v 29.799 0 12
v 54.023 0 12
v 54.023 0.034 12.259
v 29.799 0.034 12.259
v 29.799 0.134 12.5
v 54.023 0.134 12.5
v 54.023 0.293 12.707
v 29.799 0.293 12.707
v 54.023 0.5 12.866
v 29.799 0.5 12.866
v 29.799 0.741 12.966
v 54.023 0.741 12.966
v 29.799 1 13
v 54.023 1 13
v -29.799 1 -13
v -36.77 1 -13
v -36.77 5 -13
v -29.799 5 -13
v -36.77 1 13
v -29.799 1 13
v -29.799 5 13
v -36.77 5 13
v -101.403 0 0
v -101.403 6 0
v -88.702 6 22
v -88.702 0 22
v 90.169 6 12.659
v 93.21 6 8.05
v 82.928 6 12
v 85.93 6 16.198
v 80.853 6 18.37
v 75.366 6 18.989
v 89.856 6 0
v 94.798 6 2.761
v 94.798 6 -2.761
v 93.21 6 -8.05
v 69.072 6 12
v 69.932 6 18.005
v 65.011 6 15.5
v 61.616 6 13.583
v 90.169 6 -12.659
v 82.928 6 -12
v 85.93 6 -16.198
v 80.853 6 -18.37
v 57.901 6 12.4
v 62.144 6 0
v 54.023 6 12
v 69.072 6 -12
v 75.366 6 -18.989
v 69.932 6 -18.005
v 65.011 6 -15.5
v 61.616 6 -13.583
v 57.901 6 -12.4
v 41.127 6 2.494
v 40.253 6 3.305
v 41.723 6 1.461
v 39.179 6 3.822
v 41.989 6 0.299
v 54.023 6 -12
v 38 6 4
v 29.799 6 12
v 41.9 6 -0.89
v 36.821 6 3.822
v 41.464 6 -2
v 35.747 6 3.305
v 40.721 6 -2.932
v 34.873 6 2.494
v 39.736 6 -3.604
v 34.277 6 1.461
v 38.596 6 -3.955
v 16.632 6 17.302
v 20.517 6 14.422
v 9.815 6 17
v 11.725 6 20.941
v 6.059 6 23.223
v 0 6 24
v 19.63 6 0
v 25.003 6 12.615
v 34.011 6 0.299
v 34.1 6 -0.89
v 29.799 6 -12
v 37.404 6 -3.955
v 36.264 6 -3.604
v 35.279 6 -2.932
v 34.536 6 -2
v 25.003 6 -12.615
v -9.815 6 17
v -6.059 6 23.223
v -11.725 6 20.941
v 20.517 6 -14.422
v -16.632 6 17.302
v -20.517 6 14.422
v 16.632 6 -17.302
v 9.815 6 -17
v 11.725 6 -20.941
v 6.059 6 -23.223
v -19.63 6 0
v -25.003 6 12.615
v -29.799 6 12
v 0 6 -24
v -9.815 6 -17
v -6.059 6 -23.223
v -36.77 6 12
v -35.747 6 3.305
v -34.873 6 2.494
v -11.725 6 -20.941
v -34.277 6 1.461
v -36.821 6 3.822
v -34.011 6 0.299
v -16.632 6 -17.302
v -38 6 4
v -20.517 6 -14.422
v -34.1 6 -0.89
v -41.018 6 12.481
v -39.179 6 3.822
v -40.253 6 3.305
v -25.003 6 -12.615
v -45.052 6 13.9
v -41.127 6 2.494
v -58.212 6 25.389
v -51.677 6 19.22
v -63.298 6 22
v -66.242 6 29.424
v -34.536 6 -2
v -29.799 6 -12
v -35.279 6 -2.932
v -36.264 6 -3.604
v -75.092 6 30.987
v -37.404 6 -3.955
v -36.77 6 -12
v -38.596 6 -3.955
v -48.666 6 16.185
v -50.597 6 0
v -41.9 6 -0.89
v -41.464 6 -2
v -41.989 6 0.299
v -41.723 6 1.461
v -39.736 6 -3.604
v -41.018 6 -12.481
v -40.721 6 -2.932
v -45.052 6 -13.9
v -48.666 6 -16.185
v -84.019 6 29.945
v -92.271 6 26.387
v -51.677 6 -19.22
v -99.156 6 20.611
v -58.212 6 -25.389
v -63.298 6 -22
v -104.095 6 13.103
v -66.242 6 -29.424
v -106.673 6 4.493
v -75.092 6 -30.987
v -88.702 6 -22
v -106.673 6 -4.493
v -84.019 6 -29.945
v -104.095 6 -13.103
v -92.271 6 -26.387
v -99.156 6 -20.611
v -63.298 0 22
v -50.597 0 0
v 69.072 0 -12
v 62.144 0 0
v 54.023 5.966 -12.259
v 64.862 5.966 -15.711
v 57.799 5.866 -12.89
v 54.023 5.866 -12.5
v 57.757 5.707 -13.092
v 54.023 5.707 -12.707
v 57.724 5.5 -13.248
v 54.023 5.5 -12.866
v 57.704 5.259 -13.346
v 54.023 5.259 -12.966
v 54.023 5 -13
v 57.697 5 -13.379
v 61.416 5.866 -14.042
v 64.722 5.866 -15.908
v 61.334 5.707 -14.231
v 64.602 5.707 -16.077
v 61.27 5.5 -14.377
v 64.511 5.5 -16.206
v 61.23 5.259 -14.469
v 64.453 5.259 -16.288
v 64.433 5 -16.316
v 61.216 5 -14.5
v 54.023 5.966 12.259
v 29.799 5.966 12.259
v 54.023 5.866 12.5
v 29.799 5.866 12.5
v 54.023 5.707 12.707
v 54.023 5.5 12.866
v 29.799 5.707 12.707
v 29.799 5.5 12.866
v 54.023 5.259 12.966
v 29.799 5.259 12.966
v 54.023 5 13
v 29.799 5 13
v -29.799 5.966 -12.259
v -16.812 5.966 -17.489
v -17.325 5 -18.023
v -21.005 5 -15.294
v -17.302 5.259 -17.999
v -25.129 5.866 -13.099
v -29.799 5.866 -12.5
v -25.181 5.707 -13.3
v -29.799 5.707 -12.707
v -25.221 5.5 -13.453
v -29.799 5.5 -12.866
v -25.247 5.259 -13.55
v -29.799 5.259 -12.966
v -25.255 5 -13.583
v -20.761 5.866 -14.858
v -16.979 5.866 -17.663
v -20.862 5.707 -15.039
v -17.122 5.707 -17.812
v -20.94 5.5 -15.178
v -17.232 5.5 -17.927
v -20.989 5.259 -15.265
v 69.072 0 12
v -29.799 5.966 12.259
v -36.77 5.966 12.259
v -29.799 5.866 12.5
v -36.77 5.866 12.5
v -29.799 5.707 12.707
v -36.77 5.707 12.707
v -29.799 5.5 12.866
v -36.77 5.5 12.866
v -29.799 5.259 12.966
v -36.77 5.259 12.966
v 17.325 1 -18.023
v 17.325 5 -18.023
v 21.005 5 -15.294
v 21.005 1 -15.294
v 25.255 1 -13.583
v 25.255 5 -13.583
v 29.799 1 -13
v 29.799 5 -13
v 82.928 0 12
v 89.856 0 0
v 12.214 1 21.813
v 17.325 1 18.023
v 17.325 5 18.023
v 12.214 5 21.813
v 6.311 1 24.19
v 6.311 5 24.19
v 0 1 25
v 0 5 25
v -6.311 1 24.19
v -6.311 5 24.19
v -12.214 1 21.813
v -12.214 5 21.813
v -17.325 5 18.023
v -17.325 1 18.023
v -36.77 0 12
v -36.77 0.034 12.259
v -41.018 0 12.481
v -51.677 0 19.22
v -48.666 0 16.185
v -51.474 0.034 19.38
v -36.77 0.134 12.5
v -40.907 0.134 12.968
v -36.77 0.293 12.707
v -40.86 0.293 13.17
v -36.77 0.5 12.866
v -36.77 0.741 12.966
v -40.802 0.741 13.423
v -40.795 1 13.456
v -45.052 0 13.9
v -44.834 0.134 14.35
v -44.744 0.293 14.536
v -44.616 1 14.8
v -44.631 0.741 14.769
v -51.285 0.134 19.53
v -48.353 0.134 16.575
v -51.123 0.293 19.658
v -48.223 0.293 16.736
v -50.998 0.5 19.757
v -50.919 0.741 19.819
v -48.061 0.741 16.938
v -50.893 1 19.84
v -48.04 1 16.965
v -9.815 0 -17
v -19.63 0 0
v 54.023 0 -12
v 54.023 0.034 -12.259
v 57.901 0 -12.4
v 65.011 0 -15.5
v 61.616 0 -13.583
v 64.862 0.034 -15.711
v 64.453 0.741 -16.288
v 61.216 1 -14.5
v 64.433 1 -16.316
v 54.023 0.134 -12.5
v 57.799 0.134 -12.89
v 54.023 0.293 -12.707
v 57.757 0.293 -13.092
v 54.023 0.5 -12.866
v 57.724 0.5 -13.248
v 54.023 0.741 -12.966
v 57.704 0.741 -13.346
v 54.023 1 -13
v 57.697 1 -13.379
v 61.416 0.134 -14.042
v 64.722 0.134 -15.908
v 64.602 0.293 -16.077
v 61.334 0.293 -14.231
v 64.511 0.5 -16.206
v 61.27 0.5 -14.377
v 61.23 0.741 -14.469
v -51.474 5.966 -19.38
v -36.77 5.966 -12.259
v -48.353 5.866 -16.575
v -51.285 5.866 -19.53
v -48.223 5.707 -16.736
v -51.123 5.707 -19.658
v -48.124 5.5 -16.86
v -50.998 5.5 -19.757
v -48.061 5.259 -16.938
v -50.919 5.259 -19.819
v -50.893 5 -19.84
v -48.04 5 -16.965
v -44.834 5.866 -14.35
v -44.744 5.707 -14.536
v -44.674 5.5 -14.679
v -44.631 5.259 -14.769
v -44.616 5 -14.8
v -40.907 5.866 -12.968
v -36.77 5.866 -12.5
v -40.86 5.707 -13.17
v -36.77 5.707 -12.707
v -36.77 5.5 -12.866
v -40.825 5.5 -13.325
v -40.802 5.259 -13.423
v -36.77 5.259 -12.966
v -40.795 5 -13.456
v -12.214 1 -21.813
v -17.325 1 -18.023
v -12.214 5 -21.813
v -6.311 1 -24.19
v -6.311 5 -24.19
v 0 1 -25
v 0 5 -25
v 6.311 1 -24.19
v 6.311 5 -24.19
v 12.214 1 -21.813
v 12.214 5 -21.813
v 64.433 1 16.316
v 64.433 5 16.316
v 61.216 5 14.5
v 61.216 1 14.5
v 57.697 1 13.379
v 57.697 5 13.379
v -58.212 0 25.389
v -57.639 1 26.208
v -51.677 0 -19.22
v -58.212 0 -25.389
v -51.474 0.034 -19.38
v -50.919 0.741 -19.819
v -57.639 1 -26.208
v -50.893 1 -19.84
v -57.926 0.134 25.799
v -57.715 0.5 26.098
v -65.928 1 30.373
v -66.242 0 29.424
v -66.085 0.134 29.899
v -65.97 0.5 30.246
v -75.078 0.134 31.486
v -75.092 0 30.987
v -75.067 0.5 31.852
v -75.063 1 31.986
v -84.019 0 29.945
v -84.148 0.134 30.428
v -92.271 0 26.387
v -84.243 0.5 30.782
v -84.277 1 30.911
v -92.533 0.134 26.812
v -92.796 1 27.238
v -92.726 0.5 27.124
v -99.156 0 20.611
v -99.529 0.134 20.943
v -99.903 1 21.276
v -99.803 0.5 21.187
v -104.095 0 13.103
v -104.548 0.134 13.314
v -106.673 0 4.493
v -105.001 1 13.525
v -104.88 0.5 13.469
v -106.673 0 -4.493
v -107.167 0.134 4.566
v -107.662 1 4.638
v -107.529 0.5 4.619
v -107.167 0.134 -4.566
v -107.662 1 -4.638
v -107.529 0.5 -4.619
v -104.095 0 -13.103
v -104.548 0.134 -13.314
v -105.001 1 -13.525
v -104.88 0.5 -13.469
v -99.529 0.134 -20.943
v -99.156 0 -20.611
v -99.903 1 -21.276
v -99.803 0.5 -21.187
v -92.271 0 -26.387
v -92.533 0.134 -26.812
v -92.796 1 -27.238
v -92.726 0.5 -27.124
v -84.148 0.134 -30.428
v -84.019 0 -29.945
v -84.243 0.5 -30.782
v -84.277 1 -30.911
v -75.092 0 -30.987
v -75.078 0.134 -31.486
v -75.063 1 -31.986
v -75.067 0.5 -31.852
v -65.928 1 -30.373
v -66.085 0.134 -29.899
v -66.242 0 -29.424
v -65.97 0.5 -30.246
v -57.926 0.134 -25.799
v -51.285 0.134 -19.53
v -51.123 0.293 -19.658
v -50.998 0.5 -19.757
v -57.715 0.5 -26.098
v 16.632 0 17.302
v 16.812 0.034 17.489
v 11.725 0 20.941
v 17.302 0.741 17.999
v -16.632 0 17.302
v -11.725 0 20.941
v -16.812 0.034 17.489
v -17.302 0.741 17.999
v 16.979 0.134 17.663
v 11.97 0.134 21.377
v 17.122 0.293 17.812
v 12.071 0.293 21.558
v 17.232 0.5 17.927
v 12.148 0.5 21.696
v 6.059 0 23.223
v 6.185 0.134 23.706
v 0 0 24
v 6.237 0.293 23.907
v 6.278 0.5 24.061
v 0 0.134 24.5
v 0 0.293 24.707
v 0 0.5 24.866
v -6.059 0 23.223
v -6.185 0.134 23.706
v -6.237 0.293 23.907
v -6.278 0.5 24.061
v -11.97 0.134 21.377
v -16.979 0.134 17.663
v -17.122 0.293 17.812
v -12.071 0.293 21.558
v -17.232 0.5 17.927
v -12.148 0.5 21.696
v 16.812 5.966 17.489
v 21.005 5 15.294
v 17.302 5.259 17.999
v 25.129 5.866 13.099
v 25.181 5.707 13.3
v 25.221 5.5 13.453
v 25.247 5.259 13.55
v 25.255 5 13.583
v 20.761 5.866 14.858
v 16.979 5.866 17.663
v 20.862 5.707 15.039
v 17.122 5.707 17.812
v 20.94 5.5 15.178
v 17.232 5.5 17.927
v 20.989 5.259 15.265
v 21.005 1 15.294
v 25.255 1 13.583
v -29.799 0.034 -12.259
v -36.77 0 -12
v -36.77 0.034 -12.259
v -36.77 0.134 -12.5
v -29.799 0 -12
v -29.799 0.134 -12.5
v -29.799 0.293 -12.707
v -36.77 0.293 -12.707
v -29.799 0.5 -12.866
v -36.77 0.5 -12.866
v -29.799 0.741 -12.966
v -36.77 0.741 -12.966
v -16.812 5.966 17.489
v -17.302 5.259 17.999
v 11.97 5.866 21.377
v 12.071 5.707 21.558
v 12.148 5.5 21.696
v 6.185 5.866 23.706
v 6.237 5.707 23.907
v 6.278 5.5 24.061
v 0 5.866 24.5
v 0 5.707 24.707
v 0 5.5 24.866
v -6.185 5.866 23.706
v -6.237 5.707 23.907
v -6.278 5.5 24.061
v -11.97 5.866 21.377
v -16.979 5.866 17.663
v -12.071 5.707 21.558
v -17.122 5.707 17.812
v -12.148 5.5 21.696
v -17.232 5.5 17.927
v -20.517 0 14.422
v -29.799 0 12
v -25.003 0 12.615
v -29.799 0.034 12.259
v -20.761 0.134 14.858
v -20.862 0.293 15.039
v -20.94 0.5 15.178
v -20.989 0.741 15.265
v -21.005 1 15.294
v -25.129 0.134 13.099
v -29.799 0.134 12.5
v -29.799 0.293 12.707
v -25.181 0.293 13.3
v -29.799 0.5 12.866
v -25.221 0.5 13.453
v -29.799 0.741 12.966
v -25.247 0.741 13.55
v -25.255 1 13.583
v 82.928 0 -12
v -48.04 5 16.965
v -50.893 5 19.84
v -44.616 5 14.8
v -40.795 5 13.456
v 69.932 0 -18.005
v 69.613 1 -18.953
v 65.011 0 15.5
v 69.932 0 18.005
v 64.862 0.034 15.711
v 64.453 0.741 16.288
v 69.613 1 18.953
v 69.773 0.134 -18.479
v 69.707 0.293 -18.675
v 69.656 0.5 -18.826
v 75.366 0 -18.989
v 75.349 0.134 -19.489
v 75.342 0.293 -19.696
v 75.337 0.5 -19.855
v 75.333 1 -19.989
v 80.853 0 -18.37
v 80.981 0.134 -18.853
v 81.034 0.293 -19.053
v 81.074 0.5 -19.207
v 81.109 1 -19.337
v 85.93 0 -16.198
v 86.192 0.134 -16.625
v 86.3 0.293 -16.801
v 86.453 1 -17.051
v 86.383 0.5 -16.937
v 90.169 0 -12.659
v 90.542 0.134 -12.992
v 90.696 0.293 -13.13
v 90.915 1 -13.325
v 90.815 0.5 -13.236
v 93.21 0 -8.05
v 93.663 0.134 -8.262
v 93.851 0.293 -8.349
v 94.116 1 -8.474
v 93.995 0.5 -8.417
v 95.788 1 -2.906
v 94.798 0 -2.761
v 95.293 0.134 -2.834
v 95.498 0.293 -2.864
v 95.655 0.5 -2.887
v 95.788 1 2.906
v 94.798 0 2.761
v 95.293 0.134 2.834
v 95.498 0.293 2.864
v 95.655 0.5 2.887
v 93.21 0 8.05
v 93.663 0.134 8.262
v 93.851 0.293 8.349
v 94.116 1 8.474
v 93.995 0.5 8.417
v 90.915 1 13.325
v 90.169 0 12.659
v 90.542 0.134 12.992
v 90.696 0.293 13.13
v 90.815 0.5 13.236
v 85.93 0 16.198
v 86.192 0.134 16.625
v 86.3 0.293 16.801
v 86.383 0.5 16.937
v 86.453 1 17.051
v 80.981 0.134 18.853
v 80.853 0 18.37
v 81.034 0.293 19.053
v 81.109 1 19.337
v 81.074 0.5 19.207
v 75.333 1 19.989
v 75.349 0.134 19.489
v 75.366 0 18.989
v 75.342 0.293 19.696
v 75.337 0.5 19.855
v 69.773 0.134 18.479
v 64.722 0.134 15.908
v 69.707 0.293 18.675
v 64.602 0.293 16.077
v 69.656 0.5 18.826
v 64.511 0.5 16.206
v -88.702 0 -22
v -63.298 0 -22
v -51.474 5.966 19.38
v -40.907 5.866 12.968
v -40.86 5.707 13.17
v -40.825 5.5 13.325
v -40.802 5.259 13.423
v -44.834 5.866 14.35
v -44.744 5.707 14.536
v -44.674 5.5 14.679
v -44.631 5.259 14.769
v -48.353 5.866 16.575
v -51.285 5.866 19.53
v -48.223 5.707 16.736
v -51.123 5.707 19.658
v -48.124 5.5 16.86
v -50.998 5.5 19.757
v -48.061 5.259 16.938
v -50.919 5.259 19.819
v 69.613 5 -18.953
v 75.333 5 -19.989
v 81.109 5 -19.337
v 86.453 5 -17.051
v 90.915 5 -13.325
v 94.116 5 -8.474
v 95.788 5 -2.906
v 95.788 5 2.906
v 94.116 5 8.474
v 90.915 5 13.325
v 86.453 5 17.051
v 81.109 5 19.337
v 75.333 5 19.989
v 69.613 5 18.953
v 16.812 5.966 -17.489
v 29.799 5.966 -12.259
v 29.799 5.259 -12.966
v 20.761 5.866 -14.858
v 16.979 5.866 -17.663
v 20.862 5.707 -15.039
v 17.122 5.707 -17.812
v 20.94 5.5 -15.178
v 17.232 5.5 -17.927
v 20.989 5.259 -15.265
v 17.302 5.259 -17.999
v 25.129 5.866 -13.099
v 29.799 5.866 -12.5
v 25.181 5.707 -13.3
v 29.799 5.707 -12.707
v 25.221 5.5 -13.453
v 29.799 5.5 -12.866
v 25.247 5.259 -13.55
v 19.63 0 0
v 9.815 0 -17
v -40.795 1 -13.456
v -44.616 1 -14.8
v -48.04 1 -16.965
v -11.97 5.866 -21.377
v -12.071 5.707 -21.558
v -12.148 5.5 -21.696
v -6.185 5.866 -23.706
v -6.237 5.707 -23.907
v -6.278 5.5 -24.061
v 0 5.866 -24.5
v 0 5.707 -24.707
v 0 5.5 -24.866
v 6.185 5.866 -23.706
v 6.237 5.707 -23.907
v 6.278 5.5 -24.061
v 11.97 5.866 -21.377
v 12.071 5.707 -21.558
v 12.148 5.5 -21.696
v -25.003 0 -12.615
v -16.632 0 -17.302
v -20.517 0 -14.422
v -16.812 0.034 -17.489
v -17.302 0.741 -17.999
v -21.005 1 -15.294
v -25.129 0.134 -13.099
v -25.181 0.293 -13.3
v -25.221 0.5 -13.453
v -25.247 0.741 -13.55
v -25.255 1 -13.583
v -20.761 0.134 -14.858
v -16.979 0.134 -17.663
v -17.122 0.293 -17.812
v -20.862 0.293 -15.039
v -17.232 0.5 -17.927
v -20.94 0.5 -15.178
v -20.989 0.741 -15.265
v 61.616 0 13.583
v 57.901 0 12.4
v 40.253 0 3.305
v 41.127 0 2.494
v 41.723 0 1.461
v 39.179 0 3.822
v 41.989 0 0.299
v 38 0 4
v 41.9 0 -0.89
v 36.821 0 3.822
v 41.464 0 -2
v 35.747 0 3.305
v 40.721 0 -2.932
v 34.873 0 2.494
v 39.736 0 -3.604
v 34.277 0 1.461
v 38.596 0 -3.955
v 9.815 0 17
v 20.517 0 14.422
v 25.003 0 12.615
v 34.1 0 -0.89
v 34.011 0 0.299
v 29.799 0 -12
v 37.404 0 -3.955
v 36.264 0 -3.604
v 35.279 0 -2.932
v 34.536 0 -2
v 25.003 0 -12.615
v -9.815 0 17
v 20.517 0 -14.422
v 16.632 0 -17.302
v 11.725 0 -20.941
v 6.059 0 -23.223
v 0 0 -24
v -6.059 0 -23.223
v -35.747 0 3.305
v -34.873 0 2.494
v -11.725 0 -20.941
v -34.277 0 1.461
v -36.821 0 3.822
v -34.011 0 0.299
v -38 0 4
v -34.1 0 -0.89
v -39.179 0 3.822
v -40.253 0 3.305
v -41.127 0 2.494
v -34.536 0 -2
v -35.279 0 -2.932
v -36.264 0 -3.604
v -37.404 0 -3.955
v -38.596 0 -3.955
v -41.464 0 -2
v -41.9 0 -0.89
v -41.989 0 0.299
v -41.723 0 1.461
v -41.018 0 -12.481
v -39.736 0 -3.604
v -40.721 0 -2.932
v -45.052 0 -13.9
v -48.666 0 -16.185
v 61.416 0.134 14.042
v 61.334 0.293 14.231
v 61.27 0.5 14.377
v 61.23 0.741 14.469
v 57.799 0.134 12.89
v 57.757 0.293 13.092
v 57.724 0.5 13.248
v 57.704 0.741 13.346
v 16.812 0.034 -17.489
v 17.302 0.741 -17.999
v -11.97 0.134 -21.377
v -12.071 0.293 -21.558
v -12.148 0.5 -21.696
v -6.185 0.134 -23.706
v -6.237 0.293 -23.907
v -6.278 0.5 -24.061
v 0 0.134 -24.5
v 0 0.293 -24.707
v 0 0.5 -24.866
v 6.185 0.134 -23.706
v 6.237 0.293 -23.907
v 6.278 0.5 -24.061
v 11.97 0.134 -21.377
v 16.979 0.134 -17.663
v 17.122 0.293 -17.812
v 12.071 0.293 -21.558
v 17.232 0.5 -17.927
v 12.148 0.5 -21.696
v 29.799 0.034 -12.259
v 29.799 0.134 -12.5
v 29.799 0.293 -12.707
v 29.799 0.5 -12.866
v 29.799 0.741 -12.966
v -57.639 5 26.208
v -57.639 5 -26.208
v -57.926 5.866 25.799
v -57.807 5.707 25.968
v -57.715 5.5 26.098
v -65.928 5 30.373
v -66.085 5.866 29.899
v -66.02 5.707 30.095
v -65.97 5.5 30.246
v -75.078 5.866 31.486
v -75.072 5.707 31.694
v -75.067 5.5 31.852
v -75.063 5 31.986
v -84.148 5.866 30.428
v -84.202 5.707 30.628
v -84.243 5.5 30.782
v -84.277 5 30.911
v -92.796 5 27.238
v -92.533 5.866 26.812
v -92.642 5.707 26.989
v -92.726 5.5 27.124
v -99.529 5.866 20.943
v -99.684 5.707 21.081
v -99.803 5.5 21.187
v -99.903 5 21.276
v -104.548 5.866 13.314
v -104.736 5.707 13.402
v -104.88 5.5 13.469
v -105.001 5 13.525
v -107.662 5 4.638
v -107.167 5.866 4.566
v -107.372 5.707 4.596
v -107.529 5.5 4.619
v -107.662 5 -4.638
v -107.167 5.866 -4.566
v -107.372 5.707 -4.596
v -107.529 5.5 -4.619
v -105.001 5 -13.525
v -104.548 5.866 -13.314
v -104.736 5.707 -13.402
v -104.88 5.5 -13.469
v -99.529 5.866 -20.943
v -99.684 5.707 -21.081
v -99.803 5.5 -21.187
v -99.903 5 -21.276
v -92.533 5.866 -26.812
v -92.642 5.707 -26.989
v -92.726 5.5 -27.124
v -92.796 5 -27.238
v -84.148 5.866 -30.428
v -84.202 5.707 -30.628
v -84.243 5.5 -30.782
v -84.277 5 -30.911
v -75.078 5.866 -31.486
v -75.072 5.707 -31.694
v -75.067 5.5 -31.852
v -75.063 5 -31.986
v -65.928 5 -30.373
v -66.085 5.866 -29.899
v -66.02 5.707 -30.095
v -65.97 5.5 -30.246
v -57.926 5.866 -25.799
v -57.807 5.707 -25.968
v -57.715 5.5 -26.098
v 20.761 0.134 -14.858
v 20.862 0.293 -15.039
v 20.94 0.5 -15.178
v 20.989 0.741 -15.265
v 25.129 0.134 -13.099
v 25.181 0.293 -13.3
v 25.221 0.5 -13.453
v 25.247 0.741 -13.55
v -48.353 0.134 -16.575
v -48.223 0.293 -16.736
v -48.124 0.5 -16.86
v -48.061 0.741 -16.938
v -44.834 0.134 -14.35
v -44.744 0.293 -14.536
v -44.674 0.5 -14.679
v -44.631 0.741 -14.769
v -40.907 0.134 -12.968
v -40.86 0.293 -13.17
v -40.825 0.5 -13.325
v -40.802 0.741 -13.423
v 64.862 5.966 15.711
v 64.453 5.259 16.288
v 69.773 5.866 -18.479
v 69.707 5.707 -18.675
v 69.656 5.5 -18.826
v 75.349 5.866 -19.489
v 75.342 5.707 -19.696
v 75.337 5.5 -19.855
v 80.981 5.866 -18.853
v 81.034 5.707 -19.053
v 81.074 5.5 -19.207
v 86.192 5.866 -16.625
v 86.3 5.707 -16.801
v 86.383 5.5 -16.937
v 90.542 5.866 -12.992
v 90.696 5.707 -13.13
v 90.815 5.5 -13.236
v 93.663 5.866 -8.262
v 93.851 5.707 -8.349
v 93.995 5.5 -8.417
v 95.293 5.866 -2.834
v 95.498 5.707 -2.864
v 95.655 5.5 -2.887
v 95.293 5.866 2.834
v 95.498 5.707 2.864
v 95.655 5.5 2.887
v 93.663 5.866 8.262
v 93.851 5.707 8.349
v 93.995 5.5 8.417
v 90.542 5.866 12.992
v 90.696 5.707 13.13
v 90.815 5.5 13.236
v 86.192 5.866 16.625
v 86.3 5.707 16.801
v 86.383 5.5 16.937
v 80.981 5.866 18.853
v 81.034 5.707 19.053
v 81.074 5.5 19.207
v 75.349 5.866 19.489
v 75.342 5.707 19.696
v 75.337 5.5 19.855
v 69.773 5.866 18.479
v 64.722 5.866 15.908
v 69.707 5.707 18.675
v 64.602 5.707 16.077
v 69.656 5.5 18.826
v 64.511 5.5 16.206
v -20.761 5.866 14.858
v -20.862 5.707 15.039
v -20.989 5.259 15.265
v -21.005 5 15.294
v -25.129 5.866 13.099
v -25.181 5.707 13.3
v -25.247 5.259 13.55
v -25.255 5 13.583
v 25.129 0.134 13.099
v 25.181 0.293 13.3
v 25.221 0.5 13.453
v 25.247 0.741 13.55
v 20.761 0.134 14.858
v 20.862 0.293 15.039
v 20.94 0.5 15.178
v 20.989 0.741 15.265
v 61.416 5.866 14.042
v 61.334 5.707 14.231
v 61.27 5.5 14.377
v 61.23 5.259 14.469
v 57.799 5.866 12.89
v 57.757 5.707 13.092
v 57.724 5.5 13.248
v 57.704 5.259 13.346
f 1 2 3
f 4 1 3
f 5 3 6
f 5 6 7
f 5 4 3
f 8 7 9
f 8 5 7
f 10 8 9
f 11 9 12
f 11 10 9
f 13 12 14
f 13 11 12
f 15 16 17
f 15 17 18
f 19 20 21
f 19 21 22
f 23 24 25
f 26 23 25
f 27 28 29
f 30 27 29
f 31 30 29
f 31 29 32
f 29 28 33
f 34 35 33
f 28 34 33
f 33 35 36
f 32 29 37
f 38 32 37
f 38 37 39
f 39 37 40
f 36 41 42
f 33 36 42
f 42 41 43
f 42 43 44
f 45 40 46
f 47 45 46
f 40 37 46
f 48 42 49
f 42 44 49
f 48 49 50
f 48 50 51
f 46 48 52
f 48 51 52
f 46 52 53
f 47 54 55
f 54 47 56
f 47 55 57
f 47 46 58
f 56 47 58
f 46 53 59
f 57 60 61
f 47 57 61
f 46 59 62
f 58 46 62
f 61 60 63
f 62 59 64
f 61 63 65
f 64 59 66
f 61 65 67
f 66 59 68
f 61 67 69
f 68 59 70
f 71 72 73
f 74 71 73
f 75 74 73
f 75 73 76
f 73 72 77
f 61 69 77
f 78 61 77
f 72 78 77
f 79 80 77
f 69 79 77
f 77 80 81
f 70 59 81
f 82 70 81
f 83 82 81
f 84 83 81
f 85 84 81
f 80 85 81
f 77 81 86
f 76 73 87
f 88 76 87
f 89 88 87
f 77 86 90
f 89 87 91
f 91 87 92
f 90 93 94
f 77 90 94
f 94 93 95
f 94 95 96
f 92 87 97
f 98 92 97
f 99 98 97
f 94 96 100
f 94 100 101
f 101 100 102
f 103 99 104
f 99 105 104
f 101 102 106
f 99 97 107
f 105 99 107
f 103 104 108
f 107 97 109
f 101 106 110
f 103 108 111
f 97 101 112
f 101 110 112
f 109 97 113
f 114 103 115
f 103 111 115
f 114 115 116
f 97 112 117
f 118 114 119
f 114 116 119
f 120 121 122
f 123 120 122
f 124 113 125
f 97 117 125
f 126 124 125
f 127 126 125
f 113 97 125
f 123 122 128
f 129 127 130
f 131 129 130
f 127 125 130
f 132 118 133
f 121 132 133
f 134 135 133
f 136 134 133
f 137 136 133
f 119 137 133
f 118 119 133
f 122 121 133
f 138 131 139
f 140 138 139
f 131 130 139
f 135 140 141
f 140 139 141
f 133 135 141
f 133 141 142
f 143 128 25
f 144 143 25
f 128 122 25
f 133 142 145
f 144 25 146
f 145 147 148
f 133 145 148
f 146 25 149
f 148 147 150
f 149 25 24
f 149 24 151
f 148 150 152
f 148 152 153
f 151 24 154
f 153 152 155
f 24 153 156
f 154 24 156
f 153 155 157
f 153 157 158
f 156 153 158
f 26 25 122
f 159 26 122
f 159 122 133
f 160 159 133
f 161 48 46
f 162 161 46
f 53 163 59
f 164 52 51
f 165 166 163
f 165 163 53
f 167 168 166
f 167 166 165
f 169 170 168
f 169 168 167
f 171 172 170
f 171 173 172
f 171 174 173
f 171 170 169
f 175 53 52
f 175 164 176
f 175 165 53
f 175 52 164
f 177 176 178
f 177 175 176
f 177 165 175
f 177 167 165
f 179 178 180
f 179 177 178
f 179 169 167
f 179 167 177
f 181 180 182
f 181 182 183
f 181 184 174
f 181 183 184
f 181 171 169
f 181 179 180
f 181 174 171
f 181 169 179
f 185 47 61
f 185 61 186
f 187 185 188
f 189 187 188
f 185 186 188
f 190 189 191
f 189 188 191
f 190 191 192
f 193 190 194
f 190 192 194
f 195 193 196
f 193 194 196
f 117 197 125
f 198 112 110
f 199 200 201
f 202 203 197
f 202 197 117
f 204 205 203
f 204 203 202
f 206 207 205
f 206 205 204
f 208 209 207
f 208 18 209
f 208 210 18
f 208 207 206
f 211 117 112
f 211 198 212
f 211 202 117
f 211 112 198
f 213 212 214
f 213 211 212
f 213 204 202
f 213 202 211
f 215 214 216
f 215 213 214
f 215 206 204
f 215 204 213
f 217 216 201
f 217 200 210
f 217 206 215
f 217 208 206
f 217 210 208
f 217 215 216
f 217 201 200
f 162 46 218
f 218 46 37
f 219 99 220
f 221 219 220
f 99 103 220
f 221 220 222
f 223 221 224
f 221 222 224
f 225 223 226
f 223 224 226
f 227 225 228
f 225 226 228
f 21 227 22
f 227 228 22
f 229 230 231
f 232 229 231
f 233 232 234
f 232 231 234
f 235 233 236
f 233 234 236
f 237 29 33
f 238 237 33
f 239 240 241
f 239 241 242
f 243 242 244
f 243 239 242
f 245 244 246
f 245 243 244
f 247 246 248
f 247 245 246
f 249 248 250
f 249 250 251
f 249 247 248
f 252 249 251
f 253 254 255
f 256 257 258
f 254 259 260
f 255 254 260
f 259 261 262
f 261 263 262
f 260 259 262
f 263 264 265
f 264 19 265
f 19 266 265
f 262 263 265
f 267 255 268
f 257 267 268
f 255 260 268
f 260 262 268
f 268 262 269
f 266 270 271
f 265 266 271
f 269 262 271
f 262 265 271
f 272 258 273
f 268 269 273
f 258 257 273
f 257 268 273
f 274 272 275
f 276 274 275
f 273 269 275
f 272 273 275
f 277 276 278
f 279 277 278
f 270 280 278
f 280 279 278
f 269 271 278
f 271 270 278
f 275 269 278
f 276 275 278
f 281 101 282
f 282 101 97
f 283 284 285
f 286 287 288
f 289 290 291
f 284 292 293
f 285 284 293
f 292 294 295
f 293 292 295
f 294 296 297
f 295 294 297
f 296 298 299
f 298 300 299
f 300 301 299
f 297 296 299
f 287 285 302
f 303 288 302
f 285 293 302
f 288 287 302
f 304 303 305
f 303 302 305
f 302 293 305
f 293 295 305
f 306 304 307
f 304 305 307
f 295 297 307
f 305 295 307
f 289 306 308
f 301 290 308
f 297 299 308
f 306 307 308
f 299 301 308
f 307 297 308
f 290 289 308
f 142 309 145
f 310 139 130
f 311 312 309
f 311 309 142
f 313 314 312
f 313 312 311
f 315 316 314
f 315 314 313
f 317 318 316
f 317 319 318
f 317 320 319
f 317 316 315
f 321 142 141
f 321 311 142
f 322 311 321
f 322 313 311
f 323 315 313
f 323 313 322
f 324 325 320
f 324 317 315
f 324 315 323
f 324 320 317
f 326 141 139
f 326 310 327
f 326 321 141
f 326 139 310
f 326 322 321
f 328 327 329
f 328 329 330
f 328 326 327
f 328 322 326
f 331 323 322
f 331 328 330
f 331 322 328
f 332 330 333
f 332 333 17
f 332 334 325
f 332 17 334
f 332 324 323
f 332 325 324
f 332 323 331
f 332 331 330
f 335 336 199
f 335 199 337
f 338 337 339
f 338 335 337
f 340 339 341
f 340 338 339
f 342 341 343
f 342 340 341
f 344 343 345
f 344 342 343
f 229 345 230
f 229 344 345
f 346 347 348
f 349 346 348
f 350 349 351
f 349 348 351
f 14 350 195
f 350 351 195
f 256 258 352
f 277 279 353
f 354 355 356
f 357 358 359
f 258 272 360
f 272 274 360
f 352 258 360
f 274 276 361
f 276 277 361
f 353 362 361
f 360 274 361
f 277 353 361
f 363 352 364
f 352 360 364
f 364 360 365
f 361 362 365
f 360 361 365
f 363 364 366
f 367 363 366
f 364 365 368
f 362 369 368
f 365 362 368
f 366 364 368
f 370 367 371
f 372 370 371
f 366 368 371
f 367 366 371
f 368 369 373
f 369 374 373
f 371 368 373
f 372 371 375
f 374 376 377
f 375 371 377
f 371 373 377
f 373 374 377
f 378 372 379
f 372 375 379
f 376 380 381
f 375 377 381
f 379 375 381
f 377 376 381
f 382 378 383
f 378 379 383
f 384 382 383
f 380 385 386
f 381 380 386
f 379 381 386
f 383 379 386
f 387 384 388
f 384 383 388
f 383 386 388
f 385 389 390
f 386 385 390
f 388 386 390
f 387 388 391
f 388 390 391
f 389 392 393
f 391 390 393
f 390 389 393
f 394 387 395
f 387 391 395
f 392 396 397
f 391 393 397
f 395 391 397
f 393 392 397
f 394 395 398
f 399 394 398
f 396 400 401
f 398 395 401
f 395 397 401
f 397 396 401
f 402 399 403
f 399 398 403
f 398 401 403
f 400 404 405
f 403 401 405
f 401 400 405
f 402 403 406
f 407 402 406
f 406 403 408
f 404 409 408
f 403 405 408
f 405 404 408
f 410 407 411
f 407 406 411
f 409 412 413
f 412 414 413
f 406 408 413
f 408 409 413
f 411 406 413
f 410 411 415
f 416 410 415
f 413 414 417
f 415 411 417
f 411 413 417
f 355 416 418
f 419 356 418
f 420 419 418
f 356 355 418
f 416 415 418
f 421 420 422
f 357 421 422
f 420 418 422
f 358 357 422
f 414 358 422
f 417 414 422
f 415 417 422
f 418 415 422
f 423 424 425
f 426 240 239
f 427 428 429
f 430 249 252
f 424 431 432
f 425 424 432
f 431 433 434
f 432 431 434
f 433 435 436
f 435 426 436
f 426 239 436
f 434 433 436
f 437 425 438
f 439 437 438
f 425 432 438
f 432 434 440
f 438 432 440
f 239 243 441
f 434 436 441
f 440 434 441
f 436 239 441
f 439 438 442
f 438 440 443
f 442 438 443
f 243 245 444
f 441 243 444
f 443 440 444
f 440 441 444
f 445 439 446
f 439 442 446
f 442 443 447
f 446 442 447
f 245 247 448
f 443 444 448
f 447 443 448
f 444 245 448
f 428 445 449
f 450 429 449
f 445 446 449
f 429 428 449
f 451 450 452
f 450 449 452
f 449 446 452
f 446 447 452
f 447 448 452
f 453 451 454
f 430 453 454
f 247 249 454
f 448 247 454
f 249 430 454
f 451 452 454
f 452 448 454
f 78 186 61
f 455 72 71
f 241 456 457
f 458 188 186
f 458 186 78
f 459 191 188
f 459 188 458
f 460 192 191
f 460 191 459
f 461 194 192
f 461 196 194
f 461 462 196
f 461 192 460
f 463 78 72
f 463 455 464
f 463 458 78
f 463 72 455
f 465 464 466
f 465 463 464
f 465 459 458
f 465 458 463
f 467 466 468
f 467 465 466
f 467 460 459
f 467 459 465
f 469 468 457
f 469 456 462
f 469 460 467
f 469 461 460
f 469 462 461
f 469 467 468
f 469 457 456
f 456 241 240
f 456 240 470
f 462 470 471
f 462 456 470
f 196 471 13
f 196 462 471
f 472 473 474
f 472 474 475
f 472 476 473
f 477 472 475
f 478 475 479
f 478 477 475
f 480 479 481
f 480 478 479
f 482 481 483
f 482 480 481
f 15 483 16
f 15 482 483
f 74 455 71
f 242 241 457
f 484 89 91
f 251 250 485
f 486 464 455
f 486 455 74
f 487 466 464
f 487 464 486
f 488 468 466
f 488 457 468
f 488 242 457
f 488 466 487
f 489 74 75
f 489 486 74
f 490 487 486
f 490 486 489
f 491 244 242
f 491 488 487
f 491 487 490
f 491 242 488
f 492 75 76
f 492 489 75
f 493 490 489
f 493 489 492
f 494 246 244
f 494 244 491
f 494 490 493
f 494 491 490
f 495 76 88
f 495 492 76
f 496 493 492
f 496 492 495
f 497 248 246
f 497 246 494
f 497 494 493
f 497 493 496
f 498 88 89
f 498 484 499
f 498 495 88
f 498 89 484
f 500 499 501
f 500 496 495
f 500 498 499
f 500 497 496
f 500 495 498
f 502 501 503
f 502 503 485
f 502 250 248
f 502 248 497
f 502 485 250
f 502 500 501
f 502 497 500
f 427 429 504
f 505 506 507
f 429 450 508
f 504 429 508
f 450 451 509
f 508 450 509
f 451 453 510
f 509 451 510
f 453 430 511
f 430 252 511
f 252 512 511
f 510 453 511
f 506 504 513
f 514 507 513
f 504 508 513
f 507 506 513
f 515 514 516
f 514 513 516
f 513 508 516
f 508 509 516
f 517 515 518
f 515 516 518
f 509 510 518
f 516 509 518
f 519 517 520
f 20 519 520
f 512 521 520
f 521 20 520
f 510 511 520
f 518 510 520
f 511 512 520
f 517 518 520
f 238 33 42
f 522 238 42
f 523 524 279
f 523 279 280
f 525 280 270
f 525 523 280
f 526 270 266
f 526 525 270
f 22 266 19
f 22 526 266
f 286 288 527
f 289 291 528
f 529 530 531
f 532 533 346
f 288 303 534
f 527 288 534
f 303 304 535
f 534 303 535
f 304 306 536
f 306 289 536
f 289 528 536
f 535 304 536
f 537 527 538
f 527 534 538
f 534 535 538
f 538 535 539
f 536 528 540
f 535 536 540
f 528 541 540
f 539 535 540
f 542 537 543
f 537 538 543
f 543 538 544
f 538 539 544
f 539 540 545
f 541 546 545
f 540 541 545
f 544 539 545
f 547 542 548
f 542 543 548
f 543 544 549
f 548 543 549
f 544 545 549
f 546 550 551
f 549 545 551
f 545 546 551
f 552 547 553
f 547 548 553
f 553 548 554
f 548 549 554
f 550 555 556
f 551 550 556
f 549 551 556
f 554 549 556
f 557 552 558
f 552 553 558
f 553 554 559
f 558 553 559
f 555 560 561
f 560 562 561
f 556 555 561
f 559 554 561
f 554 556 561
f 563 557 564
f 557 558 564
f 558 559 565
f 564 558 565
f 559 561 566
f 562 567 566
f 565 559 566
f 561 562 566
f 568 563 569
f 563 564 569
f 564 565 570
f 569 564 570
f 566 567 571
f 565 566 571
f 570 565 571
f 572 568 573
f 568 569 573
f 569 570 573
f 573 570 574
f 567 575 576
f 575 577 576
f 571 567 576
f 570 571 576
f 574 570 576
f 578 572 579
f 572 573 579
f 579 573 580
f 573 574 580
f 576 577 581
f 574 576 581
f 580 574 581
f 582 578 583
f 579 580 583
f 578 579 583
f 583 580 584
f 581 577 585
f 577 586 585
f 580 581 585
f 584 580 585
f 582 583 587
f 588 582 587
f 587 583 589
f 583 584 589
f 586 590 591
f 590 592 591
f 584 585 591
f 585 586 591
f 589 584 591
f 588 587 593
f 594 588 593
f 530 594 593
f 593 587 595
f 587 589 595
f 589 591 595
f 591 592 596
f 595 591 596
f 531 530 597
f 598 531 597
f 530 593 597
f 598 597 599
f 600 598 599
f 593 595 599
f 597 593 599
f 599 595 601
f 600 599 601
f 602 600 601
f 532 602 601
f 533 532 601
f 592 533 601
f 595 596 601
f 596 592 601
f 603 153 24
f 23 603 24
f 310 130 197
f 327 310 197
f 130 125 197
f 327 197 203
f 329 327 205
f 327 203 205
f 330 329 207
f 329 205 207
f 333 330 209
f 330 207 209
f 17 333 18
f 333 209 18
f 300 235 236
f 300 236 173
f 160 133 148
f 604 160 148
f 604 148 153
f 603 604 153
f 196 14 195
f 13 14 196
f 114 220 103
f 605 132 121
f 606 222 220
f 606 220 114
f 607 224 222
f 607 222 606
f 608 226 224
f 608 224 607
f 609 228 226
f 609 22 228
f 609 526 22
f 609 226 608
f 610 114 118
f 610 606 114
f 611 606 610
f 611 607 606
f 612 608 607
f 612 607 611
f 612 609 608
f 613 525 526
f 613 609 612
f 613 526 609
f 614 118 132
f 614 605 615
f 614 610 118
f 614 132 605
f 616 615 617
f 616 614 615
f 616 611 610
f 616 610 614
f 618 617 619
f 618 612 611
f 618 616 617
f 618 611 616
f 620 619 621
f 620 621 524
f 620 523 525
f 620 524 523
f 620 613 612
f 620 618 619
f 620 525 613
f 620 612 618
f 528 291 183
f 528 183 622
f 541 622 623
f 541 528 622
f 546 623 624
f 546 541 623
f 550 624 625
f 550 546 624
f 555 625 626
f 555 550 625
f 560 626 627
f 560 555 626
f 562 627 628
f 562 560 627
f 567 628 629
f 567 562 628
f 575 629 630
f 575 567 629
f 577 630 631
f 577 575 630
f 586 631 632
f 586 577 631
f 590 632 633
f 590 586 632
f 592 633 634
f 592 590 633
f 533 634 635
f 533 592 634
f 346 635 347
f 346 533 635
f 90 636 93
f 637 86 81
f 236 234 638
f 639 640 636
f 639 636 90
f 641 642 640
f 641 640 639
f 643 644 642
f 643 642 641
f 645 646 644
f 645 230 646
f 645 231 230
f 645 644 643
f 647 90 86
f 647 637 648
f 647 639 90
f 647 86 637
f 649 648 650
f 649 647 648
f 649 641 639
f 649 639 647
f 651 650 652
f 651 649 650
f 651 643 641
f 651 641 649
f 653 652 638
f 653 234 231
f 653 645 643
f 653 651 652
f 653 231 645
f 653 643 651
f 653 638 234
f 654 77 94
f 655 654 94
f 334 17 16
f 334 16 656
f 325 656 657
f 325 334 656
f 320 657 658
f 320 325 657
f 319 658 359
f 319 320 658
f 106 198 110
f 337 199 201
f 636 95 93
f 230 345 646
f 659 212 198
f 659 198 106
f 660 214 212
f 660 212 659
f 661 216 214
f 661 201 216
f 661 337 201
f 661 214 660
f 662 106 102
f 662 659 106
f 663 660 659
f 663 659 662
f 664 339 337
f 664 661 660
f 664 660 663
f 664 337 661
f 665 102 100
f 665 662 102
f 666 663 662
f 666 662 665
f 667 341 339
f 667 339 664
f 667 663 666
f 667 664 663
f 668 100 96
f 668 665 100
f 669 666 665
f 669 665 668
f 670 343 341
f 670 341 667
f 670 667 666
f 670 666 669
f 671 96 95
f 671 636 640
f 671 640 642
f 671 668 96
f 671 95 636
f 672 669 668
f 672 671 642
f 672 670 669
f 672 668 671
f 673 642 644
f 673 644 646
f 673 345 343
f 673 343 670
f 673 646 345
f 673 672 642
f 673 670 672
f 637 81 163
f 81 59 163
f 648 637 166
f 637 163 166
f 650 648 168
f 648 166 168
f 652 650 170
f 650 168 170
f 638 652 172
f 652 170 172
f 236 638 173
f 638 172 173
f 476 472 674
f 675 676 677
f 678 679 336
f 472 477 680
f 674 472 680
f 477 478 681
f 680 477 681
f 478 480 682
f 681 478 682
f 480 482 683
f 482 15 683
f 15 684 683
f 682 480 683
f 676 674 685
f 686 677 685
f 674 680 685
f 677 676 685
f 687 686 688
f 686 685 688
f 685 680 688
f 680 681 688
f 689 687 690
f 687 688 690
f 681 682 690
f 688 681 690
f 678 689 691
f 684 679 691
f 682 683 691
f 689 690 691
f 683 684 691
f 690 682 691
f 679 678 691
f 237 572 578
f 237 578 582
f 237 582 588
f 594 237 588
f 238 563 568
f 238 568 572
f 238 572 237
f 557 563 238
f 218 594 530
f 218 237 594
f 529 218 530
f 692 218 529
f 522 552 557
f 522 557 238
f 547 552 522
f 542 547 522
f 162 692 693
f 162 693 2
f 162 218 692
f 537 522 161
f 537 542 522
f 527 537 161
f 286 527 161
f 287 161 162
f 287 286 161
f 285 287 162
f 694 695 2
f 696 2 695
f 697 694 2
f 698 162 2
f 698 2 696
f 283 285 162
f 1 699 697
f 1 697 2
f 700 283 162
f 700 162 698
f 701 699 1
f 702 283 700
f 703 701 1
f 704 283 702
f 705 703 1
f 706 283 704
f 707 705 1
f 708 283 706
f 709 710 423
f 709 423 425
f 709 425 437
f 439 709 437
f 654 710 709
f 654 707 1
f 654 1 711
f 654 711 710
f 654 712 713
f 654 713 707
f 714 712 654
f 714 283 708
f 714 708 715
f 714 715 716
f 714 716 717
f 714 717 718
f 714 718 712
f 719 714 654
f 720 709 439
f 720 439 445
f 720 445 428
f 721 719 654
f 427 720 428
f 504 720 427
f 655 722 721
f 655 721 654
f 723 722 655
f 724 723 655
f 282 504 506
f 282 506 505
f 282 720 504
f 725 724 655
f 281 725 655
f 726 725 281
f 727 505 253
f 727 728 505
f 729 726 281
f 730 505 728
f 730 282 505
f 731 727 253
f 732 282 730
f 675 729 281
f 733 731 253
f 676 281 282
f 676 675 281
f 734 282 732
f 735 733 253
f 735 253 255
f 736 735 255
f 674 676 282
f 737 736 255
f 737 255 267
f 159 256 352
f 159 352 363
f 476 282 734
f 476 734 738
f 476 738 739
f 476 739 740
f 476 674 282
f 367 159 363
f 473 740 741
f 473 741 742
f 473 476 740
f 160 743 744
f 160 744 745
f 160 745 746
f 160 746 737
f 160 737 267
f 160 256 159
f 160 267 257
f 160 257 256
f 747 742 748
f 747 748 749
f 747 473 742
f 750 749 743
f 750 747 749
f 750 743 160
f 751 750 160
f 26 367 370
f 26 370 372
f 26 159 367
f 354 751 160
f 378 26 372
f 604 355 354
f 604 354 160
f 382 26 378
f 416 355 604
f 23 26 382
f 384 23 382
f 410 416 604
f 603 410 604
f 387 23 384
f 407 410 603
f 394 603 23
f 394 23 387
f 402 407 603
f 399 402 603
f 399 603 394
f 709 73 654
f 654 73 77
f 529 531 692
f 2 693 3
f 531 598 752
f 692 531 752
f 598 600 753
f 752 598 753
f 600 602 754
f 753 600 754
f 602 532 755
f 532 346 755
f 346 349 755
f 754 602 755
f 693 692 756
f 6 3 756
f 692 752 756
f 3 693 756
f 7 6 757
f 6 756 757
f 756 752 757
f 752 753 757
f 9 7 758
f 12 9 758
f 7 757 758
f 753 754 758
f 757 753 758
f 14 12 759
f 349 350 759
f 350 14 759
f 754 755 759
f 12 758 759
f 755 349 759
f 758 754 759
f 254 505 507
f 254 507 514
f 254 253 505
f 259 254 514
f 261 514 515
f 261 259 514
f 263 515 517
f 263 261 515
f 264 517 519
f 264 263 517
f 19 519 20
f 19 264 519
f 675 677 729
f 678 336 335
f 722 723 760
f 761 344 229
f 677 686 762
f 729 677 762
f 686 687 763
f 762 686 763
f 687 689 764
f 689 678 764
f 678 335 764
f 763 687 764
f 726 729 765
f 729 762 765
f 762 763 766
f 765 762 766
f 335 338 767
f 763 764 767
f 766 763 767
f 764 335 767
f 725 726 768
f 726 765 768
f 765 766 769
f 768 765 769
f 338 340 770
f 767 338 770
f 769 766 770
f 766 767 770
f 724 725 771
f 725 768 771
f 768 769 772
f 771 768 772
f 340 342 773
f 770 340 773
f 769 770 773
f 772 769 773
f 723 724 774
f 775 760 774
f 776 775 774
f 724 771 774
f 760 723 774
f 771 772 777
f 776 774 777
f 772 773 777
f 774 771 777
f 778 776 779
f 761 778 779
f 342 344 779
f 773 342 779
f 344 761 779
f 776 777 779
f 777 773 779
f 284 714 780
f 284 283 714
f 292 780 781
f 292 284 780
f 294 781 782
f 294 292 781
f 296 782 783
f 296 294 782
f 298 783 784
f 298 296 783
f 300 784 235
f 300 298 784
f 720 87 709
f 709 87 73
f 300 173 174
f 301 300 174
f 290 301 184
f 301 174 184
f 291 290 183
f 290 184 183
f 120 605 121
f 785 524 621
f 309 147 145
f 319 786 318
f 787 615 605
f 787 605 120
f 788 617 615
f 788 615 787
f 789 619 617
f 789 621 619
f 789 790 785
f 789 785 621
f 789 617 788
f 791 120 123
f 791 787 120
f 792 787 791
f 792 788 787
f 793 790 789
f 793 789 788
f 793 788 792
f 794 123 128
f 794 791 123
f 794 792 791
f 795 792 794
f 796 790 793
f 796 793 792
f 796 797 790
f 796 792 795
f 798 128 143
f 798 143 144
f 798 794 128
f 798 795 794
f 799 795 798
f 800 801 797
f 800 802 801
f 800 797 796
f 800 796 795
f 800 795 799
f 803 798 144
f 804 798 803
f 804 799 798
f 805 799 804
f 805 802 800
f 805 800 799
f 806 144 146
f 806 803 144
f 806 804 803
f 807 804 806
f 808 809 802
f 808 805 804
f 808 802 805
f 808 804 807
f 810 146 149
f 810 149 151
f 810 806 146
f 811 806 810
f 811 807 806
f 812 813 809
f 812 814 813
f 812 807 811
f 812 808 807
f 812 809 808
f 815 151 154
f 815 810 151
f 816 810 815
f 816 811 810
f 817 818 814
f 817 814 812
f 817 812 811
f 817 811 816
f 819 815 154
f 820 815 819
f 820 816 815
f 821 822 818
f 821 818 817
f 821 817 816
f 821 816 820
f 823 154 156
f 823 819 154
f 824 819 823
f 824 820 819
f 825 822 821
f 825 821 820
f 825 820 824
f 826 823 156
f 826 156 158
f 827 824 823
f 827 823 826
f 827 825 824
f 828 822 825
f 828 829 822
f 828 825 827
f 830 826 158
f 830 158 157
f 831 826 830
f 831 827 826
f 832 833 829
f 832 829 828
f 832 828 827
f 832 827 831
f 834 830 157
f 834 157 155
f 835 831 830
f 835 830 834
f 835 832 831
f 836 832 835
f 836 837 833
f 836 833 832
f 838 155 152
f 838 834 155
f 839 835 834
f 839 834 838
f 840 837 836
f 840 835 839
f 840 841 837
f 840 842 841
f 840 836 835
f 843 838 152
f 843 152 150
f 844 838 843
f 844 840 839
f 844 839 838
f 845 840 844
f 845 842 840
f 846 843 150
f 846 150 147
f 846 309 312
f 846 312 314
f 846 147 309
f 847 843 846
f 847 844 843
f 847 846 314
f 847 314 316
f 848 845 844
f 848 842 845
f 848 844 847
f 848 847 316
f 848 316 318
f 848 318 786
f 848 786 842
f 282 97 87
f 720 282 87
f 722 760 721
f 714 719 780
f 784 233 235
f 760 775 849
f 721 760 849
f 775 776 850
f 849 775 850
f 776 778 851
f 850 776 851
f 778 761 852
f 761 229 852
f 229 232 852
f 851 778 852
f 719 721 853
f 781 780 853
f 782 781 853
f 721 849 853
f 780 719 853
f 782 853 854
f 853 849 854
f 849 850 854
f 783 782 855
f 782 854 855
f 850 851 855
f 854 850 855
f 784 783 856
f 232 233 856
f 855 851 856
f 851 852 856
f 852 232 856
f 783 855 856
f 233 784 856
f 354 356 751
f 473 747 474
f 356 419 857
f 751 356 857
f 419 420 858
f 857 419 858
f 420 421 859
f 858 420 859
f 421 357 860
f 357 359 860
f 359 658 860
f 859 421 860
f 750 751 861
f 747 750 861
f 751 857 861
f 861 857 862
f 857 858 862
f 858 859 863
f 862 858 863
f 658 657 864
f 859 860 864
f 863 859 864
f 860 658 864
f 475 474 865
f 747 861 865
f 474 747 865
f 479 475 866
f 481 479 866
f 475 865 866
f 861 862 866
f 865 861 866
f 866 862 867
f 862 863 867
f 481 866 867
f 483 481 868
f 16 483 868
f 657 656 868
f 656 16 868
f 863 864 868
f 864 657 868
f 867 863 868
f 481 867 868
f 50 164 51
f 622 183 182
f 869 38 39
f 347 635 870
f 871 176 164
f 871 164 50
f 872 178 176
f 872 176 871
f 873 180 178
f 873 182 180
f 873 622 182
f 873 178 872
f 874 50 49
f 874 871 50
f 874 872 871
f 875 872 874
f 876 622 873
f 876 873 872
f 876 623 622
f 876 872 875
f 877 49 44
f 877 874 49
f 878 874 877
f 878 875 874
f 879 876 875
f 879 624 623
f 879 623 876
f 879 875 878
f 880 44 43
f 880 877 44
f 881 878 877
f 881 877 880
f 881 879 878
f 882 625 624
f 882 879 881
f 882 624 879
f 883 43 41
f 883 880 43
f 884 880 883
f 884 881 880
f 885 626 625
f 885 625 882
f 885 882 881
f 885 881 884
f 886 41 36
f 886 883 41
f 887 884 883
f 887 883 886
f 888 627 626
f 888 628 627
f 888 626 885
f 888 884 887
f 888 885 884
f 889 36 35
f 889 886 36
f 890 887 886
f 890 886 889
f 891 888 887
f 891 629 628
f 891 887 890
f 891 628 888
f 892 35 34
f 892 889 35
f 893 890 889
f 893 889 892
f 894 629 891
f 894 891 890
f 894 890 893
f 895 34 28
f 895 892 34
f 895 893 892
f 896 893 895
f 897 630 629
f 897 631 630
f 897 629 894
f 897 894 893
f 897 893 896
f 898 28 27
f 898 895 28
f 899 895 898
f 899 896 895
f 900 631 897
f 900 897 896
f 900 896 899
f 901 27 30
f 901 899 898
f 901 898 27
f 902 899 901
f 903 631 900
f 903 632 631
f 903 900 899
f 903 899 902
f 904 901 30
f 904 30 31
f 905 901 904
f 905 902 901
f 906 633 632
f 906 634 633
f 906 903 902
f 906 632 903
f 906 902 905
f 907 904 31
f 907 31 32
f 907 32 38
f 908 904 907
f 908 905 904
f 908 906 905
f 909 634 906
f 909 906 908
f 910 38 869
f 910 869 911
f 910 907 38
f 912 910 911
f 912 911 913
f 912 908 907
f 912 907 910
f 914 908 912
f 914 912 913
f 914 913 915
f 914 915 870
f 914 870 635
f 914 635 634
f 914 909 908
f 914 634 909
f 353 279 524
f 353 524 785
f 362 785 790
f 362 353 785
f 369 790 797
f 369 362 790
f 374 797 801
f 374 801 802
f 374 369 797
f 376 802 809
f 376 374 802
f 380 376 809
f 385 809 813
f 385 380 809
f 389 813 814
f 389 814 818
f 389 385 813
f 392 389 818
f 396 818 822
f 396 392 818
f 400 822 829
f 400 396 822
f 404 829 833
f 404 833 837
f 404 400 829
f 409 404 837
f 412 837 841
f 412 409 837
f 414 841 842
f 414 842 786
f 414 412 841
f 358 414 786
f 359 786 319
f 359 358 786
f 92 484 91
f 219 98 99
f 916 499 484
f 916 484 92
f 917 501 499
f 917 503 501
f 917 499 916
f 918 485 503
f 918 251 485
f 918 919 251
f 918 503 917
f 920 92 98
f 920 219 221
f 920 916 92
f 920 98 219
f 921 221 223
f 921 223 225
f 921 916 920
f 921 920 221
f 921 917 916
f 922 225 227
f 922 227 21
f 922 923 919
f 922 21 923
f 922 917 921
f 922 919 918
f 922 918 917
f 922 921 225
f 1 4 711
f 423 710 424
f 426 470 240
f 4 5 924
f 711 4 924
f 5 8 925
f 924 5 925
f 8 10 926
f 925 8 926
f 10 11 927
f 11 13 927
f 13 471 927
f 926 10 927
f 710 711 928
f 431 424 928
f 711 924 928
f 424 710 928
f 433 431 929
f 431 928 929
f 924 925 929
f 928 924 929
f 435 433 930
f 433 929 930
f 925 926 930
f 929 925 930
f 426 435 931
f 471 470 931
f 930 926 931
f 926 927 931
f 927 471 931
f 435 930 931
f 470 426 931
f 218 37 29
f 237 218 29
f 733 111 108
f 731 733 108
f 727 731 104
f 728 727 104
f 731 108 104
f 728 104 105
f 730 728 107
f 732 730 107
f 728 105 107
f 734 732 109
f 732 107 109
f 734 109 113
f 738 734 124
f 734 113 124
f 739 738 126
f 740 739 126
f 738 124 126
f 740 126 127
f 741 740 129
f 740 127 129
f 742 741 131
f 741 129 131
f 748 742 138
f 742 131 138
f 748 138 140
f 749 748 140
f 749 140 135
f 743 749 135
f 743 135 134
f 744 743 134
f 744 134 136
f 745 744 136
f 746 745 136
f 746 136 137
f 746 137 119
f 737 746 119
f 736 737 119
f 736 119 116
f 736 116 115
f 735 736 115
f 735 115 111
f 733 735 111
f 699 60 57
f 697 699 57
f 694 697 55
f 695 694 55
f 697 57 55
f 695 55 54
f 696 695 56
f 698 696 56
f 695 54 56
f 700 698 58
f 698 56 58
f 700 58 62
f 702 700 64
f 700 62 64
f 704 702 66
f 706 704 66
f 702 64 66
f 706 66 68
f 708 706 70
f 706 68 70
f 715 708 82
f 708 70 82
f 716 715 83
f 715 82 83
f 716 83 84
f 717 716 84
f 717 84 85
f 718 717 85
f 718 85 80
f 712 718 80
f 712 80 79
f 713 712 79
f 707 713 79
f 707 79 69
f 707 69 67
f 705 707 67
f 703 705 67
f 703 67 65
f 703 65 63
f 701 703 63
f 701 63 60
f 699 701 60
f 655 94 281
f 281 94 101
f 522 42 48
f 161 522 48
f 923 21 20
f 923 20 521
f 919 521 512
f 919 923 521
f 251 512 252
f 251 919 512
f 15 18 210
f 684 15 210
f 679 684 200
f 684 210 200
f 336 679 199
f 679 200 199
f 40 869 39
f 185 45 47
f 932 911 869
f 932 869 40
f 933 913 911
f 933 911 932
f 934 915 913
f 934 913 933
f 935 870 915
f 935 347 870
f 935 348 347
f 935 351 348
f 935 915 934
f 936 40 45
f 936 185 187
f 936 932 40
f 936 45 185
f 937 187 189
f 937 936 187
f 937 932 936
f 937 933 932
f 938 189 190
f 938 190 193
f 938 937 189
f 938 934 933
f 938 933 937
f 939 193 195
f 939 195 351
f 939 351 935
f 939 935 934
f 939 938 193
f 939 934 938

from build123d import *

# Parameters (mm, degrees)
BOSS_EXTRUDE1_DEPTH = 6
CUT_EXTRUDE1_DEPTH  = 7
FILLET1_R           = 18
SKETCH3_R           = 4
CUT_EXTRUDE2_DEPTH  = 7
FILLET3_R           = 1


with BuildPart() as part:
    # Sketch1 → Boss-Extrude1 (new body)
    with BuildSketch(Plane(origin=(0, 0, 0), x_dir=(1, 0, 0), z_dir=(0, 1, 0))):
        with BuildLine():
            Line((-46.759616966, 13), (-21.354156504, 13))
            ThreePointArc((-21.354156504, 13), (0, 25), (21.354156504, 13))
            Line((21.354156504, 13), (60.801315846, 13))
            ThreePointArc((60.801315846, 13), (96, 0), (60.801315846, -13))
            Line((60.801315846, -13), (21.354156504, -13))
            ThreePointArc((21.354156504, -13), (0, -25), (-21.354156504, -13))
            Line((-21.354156504, -13), (-46.759616966, -13))
            ThreePointArc((-46.759616966, -13), (-108, 0), (-46.759616966, 13))
        make_face()
    extrude(amount=BOSS_EXTRUDE1_DEPTH)

    # Sketch2 → Cut-Extrude1 (cut, through all)
    with BuildSketch(Plane(origin=(0, 6, 0), x_dir=(1, 0, 0), z_dir=(0, 1, 0))):
        Polygon((19.629909152, 0), (9.814954576, 17), (-9.814954576, 17), (-19.629909152, 0), (-9.814954576, -17), (9.814954576, -17), align=None)
        Polygon((89.856406461, 0), (82.92820323, 12), (69.07179677, 12), (62.143593539, 0), (69.07179677, -12), (82.92820323, -12), align=None)
        Polygon((-50.596588156, 0), (-63.298294078, 22), (-88.701705922, 22), (-101.403411844, 0), (-88.701705922, -22), (-63.298294078, -22), align=None)
    extrude(amount=-CUT_EXTRUDE1_DEPTH, mode=Mode.SUBTRACT)

    # Fillet1
    fillet1_edges = [part.edges().sort_by_distance(p)[0] for p in [
        (-46.759616966, 3, -13),
        (-21.354156504, 3, -13),
        (21.354156504, 3, -13),
        (60.801315846, 3, -13),
        (60.801315846, 3, 13),
        (21.354156504, 3, 13),
        (-21.354156504, 3, 13),
        (-46.759616966, 3, 13),
    ]]
    fillet(fillet1_edges, radius=FILLET1_R)

    # Sketch3 → Cut-Extrude2 (cut, through all)
    with BuildSketch(Plane(origin=(0, 6, 0), x_dir=(1, 0, 0), z_dir=(0, 1, 0))):
        with Locations(Location((-38, 0, 0), (0, 0, 270))):  # turned: the seam where the file's is
            Circle(SKETCH3_R)
        with Locations(Location((38, 0, 0), (0, 0, 270))):  # turned: the seam where the file's is
            Circle(SKETCH3_R)
    extrude(amount=-CUT_EXTRUDE2_DEPTH, mode=Mode.SUBTRACT)

    # Fillet3
    fillet3_edges = [part.edges().sort_by_distance(p)[0] for p in [
        (-33.28461918, 6, 13),
        (-108, 0, 0),
        (-108, 6, 0),
        (59.485531832, 0, 13.848968115),
        (59.485531832, 6, 13.848968115),
        (59.485531832, 0, -13.848968115),
        (59.485531832, 6, -13.848968115),
        (23.075542543, 0, 14.302973388),
        (23.075542543, 6, 14.302973388),
        (23.075542543, 0, -14.302973388),
        (23.075542543, 6, -14.302973388),
        (-23.075542543, 0, -14.302973388),
        (-23.075542543, 6, -14.302973388),
        (-23.075542543, 0, 14.302973388),
        (-23.075542543, 6, 14.302973388),
        (-44.615927607, 0, 14.8),
        (-44.615927607, 6, 14.8),
        (-44.615927607, 0, -14.8),
        (-44.615927607, 6, -14.8),
        (96, 0, 0),
        (96, 6, 0),
        (41.911033938, 0, 13),
        (41.911033938, 6, 13),
        (41.911033938, 0, -13),
        (41.911033938, 6, -13),
        (0, 0, 25),
        (0, 6, 25),
        (0, 0, -25),
        (0, 6, -25),
        (-33.28461918, 0, -13),
        (-33.28461918, 6, -13),
        (-33.28461918, 0, 13),
    ]]
    fillet(fillet3_edges, radius=FILLET3_R)


solid = part.part
